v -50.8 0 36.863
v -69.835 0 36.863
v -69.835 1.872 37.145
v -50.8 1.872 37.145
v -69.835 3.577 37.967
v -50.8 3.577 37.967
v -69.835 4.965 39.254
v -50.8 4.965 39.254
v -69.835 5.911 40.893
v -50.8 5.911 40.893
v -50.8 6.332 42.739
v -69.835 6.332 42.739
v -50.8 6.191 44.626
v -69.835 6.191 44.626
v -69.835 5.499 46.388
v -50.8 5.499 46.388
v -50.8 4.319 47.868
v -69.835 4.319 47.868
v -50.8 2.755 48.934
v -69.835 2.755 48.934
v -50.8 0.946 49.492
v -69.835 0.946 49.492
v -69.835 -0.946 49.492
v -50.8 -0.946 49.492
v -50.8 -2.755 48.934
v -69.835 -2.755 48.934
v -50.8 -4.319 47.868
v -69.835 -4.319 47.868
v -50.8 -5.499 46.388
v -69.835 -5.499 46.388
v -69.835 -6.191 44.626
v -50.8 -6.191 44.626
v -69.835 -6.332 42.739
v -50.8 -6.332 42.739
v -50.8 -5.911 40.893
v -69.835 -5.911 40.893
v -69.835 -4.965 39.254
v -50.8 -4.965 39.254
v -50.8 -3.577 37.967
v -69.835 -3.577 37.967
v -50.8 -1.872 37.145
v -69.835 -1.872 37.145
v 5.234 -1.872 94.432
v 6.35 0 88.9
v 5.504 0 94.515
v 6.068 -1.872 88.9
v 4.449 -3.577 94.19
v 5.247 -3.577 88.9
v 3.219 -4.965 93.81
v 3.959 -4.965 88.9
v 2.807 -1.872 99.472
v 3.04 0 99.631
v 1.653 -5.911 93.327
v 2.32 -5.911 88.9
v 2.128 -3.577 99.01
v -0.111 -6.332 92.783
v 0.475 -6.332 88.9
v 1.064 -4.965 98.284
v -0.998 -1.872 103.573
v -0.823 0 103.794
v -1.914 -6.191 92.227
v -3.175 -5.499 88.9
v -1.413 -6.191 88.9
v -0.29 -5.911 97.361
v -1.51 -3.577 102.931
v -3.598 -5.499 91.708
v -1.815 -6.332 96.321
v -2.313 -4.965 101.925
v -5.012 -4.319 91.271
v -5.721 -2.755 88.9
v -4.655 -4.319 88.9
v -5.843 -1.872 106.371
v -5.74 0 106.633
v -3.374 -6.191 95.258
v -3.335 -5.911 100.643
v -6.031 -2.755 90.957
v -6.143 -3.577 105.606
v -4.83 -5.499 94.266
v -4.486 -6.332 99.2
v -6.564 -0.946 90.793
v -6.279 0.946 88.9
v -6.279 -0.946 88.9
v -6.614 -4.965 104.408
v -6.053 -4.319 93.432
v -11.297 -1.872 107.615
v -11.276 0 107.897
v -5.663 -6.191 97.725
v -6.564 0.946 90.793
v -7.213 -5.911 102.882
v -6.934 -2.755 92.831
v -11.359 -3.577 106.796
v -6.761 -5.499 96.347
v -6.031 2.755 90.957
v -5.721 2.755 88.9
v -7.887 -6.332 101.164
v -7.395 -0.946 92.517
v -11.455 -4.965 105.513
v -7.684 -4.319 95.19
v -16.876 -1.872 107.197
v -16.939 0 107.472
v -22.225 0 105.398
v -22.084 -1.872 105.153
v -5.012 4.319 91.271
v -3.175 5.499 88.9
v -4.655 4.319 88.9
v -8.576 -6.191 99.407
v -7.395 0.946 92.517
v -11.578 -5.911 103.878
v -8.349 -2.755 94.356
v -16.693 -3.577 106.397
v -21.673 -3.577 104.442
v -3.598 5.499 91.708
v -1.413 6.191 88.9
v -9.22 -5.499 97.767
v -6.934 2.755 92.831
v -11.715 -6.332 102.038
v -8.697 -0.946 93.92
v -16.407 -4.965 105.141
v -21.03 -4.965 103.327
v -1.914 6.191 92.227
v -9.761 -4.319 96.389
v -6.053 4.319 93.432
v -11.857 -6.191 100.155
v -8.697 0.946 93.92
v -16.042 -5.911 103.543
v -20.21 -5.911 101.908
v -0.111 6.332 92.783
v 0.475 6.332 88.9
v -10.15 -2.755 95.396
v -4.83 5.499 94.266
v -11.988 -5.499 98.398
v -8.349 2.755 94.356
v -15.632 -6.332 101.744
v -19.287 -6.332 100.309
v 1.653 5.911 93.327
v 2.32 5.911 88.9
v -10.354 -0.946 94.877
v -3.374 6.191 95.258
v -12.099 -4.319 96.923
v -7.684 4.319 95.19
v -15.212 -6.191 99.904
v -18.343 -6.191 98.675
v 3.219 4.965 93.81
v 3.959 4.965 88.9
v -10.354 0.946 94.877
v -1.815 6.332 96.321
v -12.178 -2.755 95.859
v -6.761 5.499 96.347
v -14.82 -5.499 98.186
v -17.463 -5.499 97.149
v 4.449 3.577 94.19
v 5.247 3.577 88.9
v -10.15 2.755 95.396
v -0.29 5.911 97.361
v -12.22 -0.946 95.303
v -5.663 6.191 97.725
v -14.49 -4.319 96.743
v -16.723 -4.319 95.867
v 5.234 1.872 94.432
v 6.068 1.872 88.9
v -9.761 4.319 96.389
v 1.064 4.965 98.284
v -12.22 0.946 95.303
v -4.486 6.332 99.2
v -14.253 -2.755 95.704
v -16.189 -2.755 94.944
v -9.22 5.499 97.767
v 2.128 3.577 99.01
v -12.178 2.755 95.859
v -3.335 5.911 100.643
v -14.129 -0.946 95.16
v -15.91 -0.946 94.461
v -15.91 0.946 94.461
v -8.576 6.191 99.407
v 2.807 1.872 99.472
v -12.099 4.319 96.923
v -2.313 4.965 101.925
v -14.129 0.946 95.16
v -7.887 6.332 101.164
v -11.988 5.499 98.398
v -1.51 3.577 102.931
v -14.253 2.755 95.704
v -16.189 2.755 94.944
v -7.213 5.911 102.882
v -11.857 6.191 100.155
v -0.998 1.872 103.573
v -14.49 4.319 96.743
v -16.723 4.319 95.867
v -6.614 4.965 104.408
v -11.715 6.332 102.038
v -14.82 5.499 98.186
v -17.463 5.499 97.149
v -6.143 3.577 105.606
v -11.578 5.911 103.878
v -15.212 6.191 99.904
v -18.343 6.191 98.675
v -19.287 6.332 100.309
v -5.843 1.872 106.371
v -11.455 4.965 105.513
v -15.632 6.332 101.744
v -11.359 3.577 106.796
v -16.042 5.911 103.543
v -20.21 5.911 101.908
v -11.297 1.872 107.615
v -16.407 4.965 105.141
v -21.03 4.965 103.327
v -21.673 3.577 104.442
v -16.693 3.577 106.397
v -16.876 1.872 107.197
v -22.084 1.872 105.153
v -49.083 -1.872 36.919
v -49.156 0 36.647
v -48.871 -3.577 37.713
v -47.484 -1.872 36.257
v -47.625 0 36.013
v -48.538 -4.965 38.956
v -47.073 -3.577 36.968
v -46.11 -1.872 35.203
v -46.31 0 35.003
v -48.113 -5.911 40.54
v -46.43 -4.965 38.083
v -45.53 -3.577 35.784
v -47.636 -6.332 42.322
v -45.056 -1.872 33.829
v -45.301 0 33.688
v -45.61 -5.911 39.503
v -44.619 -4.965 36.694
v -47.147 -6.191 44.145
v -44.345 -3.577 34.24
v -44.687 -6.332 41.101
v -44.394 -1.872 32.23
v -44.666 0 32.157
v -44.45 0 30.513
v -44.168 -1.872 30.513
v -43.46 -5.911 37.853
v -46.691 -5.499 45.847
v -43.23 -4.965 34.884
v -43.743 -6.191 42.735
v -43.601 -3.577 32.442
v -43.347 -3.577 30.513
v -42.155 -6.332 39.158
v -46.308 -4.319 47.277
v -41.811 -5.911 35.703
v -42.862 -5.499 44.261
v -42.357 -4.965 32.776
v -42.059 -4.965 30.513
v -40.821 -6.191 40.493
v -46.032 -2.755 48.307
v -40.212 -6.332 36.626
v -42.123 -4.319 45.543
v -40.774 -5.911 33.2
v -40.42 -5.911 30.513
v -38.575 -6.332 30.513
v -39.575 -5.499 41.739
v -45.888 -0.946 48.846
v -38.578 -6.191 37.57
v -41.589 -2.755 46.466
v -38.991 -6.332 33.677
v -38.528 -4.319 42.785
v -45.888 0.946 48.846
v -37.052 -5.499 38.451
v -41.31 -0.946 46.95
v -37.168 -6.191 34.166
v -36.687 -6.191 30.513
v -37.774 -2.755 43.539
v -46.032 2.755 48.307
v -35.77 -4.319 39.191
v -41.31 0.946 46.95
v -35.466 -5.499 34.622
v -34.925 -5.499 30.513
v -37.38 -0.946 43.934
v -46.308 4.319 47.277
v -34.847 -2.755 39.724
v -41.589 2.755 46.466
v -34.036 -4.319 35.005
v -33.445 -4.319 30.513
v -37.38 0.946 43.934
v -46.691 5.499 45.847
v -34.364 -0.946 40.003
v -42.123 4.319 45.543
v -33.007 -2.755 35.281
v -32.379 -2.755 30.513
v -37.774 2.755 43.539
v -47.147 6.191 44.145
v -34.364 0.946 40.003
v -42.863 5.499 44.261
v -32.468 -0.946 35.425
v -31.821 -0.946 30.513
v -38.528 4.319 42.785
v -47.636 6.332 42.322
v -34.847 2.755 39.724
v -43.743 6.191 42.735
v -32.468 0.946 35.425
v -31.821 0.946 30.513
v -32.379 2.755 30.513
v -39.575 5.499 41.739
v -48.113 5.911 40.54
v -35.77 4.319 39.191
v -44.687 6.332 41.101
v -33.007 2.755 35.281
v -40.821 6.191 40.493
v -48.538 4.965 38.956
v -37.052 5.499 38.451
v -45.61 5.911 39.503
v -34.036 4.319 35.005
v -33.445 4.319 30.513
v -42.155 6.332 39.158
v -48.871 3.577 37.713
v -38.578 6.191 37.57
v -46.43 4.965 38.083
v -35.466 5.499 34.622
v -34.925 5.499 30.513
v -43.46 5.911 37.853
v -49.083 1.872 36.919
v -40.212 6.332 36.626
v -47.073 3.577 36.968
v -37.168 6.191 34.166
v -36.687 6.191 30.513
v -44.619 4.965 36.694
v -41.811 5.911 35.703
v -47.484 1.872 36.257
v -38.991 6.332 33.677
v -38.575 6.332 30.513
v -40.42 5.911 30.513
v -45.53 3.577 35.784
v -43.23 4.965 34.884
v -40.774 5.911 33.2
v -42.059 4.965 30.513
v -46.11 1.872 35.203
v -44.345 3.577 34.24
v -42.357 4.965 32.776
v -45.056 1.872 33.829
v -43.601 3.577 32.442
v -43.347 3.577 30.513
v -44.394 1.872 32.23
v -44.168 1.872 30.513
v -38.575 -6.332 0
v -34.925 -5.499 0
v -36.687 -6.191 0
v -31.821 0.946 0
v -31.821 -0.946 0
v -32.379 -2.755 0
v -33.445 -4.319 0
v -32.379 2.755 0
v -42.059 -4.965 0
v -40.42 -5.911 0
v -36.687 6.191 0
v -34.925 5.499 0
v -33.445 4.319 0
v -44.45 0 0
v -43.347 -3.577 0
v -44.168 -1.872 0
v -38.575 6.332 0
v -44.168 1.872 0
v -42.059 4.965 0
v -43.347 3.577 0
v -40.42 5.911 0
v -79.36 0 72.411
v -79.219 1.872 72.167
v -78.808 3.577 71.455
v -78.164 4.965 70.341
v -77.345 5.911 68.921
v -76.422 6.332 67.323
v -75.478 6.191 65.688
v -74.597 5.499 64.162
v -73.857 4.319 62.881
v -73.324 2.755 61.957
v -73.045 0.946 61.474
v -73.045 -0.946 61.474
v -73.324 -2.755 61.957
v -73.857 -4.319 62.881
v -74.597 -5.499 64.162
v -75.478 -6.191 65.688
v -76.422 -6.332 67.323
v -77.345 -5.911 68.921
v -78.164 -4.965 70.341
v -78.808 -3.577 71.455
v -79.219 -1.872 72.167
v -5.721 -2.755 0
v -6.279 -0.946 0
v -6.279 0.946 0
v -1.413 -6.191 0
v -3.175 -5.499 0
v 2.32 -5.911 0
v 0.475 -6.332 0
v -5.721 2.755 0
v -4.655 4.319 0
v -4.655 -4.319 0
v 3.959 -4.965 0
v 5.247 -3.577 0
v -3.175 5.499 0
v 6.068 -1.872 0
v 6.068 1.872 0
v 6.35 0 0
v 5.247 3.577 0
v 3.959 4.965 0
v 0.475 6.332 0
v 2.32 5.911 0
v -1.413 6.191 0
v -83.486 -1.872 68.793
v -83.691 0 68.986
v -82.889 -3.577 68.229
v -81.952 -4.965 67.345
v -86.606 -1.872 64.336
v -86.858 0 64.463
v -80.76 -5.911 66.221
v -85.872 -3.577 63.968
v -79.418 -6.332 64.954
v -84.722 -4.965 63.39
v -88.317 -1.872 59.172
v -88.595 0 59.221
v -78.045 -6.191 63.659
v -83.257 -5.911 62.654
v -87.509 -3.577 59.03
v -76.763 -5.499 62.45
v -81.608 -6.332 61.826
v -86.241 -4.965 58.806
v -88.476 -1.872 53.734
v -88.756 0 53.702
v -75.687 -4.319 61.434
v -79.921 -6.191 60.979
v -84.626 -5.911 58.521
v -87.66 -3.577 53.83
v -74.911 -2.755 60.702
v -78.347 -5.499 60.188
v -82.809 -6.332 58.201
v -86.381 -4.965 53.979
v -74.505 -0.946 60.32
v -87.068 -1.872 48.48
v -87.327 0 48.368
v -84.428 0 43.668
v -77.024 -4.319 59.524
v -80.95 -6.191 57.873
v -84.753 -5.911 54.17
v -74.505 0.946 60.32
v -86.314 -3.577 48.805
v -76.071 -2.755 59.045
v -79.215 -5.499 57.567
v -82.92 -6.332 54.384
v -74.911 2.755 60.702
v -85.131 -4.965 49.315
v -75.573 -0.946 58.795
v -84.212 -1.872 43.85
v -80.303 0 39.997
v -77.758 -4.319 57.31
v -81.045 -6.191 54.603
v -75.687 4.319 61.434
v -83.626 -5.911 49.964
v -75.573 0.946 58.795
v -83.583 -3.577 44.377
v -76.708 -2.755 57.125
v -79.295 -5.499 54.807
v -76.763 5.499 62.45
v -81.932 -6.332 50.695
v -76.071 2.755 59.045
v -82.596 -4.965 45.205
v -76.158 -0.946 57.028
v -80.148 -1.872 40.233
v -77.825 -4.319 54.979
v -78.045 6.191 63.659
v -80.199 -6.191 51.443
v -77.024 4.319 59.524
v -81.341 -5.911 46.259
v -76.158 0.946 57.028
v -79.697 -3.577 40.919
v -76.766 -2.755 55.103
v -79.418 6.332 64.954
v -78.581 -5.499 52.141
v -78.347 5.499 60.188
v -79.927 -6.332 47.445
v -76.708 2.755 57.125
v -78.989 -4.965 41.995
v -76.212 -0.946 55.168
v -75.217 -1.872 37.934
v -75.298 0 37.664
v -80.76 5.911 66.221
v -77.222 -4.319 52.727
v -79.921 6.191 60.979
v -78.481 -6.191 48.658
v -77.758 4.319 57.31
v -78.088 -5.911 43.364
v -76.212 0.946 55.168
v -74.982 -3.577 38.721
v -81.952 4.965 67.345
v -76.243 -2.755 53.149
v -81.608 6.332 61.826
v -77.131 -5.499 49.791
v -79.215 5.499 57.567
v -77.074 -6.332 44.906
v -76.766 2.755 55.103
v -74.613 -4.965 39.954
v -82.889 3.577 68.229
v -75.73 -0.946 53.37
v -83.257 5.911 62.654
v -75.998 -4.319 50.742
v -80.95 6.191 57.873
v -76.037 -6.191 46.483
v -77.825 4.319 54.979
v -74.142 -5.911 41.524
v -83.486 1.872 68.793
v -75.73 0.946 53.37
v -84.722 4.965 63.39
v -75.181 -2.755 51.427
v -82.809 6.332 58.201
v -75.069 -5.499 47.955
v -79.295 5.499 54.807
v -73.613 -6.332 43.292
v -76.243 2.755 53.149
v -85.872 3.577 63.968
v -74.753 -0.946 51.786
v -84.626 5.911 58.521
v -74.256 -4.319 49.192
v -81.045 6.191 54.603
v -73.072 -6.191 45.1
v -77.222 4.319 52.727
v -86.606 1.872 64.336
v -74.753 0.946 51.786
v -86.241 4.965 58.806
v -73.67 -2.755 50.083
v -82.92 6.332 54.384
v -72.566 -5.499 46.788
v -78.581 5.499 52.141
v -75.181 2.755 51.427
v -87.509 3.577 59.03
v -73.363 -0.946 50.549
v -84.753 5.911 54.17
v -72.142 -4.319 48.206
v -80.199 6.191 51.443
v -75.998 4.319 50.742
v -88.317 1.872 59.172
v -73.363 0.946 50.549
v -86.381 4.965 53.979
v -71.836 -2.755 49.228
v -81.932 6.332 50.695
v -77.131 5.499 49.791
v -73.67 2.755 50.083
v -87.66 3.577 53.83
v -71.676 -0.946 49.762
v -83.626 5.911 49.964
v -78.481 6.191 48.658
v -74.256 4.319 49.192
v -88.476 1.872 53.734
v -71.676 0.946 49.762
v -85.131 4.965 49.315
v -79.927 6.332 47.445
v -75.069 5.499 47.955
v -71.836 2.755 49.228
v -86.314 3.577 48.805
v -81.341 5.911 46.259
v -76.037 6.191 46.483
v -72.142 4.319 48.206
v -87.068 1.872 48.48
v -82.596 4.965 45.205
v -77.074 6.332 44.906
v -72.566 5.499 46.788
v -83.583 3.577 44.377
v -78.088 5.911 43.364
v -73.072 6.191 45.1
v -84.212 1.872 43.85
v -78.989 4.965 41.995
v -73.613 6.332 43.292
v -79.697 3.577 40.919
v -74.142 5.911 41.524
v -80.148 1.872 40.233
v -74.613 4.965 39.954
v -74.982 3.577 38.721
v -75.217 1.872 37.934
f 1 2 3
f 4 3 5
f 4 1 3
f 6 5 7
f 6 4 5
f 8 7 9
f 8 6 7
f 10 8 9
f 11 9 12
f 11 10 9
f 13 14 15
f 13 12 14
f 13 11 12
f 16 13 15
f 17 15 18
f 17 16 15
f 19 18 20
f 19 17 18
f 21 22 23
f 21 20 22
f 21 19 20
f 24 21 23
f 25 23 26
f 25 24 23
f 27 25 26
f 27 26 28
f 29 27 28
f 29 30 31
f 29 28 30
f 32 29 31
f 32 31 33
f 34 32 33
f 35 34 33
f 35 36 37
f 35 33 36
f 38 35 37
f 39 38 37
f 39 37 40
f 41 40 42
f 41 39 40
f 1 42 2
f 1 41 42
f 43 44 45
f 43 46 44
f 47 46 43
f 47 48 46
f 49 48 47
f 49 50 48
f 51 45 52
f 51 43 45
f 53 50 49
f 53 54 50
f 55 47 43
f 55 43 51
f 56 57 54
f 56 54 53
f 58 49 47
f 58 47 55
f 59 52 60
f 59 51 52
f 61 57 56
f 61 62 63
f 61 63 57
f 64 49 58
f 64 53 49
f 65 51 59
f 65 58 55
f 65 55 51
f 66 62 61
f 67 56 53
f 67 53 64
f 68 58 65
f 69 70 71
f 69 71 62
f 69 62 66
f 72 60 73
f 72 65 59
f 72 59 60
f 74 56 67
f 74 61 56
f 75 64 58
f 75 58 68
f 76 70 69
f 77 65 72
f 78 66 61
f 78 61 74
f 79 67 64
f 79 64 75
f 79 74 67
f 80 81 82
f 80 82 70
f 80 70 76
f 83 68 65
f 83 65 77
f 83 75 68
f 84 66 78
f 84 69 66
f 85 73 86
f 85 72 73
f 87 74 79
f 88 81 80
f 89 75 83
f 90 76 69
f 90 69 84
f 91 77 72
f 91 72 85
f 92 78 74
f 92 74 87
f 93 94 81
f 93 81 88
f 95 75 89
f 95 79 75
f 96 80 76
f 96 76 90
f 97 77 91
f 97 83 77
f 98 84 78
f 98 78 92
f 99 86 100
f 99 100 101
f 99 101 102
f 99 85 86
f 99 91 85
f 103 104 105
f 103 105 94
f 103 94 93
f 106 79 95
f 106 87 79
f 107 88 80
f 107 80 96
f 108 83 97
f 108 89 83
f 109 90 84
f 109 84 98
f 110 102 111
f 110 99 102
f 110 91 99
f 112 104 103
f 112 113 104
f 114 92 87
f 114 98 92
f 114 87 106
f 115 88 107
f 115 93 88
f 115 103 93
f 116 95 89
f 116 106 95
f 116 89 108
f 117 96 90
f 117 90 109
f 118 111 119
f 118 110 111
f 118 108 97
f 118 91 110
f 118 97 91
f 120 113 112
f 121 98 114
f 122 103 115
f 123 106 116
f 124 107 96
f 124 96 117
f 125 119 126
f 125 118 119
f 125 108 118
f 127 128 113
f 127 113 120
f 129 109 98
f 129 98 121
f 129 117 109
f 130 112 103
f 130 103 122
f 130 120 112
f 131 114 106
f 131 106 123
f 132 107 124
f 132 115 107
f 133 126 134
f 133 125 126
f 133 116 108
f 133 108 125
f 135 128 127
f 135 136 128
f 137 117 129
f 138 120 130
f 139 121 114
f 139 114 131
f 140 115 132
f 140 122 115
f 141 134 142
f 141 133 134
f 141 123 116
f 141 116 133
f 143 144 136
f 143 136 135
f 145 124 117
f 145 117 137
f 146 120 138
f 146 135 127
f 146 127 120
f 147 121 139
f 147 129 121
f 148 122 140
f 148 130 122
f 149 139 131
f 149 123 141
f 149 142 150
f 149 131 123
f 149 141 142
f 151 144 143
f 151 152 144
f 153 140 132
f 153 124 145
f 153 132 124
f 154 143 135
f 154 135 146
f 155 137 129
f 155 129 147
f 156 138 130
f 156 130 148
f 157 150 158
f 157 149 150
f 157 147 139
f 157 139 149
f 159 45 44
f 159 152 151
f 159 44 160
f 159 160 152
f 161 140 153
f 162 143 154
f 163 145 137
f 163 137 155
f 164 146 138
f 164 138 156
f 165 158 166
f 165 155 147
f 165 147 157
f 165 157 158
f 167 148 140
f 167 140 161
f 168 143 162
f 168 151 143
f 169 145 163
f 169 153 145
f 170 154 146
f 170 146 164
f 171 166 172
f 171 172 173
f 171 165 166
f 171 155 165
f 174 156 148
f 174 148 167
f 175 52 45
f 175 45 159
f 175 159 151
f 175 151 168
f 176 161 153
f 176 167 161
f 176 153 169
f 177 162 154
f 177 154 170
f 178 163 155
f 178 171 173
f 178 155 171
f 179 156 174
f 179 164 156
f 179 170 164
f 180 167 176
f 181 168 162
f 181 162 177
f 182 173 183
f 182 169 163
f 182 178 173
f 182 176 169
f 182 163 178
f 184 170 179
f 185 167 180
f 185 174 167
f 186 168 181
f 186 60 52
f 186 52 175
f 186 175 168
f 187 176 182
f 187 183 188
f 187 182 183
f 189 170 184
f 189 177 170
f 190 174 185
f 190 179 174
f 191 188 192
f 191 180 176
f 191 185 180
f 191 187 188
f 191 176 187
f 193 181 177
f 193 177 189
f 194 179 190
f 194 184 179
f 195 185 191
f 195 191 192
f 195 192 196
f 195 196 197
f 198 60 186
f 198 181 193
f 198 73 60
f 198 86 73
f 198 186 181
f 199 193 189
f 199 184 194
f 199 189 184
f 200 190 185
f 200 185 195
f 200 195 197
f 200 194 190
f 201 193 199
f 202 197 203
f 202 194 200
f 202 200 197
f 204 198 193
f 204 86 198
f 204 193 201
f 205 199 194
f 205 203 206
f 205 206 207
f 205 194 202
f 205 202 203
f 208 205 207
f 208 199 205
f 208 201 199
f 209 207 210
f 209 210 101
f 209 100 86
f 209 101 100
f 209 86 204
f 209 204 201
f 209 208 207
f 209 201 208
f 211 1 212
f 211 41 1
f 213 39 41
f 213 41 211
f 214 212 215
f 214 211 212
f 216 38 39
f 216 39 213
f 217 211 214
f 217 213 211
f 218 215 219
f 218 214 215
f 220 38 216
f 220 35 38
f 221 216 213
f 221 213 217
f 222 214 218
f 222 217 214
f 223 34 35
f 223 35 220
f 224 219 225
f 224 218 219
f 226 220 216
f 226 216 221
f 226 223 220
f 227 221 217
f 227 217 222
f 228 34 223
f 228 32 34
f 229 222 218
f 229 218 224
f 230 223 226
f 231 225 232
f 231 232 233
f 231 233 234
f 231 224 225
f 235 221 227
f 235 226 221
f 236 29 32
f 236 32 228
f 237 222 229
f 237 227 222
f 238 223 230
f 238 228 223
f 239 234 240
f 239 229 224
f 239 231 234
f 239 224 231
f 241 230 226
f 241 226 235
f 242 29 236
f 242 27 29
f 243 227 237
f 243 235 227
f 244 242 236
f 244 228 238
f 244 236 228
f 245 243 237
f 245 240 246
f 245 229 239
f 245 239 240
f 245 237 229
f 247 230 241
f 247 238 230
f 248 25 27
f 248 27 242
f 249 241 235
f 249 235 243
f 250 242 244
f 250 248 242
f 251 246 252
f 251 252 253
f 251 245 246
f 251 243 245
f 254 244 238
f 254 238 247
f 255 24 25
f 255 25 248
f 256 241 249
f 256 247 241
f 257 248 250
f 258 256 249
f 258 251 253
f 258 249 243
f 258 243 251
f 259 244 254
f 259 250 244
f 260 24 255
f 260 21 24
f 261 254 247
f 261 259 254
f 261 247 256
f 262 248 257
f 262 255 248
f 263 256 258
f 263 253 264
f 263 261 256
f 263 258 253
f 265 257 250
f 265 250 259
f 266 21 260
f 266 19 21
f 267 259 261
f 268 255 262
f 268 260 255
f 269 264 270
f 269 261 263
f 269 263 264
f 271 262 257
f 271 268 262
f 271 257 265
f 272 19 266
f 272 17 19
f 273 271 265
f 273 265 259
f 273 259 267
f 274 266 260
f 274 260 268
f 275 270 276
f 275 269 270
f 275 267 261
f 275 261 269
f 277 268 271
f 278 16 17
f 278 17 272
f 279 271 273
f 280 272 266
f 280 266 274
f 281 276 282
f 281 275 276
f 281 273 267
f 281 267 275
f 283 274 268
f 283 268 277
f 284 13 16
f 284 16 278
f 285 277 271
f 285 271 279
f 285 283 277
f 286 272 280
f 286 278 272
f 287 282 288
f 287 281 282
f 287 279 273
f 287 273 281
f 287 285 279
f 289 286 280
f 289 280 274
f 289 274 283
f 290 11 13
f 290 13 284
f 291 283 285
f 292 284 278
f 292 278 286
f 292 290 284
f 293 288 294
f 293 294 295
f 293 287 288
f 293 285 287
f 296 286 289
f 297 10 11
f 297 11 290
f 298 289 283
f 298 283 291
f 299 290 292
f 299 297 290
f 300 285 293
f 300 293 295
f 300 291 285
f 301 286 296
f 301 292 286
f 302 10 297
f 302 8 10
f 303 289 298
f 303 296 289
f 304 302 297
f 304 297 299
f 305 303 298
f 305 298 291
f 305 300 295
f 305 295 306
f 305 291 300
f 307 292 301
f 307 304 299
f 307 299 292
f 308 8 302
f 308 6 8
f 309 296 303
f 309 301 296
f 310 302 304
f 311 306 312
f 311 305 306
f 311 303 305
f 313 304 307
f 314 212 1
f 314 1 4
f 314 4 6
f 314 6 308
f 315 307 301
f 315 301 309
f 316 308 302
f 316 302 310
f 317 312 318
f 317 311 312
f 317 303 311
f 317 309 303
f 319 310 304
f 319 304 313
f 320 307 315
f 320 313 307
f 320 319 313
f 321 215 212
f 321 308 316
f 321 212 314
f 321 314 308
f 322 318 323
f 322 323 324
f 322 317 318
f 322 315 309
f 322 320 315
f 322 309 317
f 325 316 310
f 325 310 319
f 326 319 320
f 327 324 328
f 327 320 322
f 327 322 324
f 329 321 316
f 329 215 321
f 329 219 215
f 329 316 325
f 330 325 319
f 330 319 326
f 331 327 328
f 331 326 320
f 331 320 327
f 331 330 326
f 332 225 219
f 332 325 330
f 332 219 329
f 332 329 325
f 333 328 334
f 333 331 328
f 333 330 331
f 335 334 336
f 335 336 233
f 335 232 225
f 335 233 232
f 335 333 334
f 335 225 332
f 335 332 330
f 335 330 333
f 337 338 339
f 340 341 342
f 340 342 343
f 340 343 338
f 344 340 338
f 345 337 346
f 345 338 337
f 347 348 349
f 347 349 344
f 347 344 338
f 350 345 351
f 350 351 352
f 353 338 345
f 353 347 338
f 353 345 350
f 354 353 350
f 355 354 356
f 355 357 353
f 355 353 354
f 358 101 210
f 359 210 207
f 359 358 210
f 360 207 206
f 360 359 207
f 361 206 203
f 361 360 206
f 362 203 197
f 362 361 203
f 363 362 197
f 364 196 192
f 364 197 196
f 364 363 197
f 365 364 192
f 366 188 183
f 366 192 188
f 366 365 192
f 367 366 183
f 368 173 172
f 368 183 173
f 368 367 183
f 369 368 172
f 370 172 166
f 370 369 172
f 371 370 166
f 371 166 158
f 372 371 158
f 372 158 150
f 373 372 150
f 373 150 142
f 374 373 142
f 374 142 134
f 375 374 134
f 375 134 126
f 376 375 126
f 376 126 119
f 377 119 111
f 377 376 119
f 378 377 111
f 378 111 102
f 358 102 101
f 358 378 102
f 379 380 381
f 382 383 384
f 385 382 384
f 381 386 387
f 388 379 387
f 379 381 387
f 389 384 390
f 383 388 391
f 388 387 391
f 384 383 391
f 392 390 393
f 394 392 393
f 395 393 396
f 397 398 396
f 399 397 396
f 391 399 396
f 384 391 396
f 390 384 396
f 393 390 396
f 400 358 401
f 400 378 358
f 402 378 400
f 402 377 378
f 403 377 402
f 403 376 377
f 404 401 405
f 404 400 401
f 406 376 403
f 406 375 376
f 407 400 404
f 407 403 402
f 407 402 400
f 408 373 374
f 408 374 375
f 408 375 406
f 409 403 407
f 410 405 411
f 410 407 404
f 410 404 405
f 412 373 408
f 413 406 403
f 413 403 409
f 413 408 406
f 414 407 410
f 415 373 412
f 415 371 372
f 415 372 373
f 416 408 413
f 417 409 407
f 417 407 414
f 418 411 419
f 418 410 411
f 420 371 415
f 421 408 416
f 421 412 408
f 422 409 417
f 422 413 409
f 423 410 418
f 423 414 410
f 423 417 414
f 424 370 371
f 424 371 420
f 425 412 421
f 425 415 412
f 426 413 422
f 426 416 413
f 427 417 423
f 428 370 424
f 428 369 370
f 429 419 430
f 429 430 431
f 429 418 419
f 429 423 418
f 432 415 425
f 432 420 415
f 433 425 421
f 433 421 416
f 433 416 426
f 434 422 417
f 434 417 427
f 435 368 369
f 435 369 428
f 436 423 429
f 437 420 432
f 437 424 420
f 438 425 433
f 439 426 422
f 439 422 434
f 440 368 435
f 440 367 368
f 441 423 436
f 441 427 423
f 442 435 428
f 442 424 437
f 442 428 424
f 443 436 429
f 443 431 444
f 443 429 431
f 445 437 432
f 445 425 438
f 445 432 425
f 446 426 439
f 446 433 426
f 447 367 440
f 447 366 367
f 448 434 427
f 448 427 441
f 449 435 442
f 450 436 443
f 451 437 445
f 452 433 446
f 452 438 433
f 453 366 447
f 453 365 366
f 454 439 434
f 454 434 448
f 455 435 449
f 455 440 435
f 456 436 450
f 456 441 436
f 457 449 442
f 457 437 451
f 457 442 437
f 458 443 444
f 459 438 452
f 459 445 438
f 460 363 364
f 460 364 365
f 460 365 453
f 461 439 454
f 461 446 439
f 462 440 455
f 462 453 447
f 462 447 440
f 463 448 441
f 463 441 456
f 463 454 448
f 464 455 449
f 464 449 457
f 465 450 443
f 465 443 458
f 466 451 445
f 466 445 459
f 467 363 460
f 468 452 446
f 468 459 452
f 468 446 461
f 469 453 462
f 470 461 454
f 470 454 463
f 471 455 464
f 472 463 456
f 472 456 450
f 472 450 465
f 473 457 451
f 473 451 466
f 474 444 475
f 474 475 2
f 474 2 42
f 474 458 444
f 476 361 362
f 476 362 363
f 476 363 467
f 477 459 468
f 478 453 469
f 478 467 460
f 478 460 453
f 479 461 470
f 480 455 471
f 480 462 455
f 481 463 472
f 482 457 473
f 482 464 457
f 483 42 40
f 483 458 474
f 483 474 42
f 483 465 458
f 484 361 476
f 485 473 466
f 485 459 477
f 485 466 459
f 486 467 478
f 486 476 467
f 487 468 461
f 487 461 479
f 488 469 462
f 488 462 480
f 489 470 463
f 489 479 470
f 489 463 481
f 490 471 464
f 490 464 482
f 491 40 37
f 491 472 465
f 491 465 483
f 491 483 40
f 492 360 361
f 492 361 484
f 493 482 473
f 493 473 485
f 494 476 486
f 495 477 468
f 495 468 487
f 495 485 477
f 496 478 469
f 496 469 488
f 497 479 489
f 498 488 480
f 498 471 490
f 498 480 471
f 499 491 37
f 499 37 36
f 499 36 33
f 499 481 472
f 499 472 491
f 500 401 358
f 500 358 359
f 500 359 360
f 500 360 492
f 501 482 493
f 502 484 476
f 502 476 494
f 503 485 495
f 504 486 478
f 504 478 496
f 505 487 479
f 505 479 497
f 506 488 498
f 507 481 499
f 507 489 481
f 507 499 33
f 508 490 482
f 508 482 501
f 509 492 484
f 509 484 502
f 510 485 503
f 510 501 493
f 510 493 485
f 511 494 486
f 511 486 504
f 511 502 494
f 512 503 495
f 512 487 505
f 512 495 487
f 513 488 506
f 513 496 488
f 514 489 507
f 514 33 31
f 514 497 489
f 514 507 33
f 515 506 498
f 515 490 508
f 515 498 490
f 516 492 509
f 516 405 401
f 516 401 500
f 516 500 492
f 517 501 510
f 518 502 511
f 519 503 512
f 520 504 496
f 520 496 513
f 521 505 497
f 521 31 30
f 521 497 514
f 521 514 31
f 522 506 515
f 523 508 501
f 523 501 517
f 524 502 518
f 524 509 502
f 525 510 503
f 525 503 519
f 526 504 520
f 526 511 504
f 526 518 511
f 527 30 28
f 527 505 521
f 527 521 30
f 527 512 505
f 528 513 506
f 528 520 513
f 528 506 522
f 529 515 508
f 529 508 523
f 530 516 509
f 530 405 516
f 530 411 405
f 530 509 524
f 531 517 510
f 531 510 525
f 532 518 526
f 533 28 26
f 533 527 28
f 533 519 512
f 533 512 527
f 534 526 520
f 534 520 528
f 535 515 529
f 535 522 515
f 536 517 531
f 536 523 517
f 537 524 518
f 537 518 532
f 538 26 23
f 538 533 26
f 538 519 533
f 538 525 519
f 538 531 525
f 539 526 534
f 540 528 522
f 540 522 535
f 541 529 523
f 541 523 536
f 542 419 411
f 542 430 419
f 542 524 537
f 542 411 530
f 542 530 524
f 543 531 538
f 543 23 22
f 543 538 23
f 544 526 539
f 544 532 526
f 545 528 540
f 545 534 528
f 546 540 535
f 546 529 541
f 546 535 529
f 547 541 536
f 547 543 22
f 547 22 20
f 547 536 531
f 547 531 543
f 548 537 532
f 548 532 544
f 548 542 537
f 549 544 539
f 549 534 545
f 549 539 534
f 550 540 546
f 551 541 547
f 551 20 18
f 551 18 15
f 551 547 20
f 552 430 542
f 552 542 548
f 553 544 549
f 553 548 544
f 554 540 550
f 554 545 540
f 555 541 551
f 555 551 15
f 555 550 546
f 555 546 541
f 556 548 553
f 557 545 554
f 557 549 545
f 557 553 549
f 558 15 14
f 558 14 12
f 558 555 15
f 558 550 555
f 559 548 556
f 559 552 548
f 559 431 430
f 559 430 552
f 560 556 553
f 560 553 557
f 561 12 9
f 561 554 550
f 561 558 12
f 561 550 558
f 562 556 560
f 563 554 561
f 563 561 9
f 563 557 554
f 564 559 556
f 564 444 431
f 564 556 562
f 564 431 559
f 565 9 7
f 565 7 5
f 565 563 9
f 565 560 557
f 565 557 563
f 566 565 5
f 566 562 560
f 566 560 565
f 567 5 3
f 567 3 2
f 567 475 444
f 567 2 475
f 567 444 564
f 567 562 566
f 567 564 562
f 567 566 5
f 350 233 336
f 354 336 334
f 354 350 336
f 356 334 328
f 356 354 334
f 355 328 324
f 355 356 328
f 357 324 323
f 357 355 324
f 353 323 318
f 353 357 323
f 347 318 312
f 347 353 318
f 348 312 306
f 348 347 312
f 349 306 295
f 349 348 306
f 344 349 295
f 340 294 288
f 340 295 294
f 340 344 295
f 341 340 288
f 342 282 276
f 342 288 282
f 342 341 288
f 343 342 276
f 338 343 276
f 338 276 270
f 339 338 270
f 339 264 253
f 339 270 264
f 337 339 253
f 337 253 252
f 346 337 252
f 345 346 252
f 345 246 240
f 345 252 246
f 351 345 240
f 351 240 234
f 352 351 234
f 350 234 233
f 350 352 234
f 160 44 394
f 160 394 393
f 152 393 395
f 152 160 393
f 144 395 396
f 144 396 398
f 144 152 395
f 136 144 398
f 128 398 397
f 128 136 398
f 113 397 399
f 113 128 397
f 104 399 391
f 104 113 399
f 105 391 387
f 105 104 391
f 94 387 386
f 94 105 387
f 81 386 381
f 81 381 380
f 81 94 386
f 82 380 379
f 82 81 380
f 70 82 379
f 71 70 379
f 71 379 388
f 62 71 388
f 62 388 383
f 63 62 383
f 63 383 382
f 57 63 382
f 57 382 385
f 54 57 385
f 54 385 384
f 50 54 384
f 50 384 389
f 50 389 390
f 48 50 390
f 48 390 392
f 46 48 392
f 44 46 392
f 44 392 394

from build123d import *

# Parameters (mm, degrees)
F2_R = 6.35


with BuildPart() as f3:
    # F3: sweep along a path in F0
    with BuildLine(Plane.XZ) as f3_path:
        Line((0, 0), (0, 88.9))
        ThreePointArc((0, 88.9), (-6.35, 99.8985226281), (-19.05, 99.8985226281))
        Line((-19.05, 99.8985226281), (-76.1846965395, 66.9117902009))
        ThreePointArc((-76.1846965395, 66.9117902009), (-82.1019545334, 52.6262657001), (-69.8346965395, 43.2132675729))
        Line((-69.8346965395, 43.2132675729), (-50.8, 43.2132675729))
        ThreePointArc((-50.8, 43.2132675729), (-41.8197438789, 39.4935236939), (-38.1, 30.5132675729))
        Line((-38.1, 30.5132675729), (-38.1, 0))
    # F2 (on line) → F3 (sweep)
    with BuildSketch(Plane.XY):
        Circle(F2_R)
    sweep(path=f3_path.line)


solid = f3.part
